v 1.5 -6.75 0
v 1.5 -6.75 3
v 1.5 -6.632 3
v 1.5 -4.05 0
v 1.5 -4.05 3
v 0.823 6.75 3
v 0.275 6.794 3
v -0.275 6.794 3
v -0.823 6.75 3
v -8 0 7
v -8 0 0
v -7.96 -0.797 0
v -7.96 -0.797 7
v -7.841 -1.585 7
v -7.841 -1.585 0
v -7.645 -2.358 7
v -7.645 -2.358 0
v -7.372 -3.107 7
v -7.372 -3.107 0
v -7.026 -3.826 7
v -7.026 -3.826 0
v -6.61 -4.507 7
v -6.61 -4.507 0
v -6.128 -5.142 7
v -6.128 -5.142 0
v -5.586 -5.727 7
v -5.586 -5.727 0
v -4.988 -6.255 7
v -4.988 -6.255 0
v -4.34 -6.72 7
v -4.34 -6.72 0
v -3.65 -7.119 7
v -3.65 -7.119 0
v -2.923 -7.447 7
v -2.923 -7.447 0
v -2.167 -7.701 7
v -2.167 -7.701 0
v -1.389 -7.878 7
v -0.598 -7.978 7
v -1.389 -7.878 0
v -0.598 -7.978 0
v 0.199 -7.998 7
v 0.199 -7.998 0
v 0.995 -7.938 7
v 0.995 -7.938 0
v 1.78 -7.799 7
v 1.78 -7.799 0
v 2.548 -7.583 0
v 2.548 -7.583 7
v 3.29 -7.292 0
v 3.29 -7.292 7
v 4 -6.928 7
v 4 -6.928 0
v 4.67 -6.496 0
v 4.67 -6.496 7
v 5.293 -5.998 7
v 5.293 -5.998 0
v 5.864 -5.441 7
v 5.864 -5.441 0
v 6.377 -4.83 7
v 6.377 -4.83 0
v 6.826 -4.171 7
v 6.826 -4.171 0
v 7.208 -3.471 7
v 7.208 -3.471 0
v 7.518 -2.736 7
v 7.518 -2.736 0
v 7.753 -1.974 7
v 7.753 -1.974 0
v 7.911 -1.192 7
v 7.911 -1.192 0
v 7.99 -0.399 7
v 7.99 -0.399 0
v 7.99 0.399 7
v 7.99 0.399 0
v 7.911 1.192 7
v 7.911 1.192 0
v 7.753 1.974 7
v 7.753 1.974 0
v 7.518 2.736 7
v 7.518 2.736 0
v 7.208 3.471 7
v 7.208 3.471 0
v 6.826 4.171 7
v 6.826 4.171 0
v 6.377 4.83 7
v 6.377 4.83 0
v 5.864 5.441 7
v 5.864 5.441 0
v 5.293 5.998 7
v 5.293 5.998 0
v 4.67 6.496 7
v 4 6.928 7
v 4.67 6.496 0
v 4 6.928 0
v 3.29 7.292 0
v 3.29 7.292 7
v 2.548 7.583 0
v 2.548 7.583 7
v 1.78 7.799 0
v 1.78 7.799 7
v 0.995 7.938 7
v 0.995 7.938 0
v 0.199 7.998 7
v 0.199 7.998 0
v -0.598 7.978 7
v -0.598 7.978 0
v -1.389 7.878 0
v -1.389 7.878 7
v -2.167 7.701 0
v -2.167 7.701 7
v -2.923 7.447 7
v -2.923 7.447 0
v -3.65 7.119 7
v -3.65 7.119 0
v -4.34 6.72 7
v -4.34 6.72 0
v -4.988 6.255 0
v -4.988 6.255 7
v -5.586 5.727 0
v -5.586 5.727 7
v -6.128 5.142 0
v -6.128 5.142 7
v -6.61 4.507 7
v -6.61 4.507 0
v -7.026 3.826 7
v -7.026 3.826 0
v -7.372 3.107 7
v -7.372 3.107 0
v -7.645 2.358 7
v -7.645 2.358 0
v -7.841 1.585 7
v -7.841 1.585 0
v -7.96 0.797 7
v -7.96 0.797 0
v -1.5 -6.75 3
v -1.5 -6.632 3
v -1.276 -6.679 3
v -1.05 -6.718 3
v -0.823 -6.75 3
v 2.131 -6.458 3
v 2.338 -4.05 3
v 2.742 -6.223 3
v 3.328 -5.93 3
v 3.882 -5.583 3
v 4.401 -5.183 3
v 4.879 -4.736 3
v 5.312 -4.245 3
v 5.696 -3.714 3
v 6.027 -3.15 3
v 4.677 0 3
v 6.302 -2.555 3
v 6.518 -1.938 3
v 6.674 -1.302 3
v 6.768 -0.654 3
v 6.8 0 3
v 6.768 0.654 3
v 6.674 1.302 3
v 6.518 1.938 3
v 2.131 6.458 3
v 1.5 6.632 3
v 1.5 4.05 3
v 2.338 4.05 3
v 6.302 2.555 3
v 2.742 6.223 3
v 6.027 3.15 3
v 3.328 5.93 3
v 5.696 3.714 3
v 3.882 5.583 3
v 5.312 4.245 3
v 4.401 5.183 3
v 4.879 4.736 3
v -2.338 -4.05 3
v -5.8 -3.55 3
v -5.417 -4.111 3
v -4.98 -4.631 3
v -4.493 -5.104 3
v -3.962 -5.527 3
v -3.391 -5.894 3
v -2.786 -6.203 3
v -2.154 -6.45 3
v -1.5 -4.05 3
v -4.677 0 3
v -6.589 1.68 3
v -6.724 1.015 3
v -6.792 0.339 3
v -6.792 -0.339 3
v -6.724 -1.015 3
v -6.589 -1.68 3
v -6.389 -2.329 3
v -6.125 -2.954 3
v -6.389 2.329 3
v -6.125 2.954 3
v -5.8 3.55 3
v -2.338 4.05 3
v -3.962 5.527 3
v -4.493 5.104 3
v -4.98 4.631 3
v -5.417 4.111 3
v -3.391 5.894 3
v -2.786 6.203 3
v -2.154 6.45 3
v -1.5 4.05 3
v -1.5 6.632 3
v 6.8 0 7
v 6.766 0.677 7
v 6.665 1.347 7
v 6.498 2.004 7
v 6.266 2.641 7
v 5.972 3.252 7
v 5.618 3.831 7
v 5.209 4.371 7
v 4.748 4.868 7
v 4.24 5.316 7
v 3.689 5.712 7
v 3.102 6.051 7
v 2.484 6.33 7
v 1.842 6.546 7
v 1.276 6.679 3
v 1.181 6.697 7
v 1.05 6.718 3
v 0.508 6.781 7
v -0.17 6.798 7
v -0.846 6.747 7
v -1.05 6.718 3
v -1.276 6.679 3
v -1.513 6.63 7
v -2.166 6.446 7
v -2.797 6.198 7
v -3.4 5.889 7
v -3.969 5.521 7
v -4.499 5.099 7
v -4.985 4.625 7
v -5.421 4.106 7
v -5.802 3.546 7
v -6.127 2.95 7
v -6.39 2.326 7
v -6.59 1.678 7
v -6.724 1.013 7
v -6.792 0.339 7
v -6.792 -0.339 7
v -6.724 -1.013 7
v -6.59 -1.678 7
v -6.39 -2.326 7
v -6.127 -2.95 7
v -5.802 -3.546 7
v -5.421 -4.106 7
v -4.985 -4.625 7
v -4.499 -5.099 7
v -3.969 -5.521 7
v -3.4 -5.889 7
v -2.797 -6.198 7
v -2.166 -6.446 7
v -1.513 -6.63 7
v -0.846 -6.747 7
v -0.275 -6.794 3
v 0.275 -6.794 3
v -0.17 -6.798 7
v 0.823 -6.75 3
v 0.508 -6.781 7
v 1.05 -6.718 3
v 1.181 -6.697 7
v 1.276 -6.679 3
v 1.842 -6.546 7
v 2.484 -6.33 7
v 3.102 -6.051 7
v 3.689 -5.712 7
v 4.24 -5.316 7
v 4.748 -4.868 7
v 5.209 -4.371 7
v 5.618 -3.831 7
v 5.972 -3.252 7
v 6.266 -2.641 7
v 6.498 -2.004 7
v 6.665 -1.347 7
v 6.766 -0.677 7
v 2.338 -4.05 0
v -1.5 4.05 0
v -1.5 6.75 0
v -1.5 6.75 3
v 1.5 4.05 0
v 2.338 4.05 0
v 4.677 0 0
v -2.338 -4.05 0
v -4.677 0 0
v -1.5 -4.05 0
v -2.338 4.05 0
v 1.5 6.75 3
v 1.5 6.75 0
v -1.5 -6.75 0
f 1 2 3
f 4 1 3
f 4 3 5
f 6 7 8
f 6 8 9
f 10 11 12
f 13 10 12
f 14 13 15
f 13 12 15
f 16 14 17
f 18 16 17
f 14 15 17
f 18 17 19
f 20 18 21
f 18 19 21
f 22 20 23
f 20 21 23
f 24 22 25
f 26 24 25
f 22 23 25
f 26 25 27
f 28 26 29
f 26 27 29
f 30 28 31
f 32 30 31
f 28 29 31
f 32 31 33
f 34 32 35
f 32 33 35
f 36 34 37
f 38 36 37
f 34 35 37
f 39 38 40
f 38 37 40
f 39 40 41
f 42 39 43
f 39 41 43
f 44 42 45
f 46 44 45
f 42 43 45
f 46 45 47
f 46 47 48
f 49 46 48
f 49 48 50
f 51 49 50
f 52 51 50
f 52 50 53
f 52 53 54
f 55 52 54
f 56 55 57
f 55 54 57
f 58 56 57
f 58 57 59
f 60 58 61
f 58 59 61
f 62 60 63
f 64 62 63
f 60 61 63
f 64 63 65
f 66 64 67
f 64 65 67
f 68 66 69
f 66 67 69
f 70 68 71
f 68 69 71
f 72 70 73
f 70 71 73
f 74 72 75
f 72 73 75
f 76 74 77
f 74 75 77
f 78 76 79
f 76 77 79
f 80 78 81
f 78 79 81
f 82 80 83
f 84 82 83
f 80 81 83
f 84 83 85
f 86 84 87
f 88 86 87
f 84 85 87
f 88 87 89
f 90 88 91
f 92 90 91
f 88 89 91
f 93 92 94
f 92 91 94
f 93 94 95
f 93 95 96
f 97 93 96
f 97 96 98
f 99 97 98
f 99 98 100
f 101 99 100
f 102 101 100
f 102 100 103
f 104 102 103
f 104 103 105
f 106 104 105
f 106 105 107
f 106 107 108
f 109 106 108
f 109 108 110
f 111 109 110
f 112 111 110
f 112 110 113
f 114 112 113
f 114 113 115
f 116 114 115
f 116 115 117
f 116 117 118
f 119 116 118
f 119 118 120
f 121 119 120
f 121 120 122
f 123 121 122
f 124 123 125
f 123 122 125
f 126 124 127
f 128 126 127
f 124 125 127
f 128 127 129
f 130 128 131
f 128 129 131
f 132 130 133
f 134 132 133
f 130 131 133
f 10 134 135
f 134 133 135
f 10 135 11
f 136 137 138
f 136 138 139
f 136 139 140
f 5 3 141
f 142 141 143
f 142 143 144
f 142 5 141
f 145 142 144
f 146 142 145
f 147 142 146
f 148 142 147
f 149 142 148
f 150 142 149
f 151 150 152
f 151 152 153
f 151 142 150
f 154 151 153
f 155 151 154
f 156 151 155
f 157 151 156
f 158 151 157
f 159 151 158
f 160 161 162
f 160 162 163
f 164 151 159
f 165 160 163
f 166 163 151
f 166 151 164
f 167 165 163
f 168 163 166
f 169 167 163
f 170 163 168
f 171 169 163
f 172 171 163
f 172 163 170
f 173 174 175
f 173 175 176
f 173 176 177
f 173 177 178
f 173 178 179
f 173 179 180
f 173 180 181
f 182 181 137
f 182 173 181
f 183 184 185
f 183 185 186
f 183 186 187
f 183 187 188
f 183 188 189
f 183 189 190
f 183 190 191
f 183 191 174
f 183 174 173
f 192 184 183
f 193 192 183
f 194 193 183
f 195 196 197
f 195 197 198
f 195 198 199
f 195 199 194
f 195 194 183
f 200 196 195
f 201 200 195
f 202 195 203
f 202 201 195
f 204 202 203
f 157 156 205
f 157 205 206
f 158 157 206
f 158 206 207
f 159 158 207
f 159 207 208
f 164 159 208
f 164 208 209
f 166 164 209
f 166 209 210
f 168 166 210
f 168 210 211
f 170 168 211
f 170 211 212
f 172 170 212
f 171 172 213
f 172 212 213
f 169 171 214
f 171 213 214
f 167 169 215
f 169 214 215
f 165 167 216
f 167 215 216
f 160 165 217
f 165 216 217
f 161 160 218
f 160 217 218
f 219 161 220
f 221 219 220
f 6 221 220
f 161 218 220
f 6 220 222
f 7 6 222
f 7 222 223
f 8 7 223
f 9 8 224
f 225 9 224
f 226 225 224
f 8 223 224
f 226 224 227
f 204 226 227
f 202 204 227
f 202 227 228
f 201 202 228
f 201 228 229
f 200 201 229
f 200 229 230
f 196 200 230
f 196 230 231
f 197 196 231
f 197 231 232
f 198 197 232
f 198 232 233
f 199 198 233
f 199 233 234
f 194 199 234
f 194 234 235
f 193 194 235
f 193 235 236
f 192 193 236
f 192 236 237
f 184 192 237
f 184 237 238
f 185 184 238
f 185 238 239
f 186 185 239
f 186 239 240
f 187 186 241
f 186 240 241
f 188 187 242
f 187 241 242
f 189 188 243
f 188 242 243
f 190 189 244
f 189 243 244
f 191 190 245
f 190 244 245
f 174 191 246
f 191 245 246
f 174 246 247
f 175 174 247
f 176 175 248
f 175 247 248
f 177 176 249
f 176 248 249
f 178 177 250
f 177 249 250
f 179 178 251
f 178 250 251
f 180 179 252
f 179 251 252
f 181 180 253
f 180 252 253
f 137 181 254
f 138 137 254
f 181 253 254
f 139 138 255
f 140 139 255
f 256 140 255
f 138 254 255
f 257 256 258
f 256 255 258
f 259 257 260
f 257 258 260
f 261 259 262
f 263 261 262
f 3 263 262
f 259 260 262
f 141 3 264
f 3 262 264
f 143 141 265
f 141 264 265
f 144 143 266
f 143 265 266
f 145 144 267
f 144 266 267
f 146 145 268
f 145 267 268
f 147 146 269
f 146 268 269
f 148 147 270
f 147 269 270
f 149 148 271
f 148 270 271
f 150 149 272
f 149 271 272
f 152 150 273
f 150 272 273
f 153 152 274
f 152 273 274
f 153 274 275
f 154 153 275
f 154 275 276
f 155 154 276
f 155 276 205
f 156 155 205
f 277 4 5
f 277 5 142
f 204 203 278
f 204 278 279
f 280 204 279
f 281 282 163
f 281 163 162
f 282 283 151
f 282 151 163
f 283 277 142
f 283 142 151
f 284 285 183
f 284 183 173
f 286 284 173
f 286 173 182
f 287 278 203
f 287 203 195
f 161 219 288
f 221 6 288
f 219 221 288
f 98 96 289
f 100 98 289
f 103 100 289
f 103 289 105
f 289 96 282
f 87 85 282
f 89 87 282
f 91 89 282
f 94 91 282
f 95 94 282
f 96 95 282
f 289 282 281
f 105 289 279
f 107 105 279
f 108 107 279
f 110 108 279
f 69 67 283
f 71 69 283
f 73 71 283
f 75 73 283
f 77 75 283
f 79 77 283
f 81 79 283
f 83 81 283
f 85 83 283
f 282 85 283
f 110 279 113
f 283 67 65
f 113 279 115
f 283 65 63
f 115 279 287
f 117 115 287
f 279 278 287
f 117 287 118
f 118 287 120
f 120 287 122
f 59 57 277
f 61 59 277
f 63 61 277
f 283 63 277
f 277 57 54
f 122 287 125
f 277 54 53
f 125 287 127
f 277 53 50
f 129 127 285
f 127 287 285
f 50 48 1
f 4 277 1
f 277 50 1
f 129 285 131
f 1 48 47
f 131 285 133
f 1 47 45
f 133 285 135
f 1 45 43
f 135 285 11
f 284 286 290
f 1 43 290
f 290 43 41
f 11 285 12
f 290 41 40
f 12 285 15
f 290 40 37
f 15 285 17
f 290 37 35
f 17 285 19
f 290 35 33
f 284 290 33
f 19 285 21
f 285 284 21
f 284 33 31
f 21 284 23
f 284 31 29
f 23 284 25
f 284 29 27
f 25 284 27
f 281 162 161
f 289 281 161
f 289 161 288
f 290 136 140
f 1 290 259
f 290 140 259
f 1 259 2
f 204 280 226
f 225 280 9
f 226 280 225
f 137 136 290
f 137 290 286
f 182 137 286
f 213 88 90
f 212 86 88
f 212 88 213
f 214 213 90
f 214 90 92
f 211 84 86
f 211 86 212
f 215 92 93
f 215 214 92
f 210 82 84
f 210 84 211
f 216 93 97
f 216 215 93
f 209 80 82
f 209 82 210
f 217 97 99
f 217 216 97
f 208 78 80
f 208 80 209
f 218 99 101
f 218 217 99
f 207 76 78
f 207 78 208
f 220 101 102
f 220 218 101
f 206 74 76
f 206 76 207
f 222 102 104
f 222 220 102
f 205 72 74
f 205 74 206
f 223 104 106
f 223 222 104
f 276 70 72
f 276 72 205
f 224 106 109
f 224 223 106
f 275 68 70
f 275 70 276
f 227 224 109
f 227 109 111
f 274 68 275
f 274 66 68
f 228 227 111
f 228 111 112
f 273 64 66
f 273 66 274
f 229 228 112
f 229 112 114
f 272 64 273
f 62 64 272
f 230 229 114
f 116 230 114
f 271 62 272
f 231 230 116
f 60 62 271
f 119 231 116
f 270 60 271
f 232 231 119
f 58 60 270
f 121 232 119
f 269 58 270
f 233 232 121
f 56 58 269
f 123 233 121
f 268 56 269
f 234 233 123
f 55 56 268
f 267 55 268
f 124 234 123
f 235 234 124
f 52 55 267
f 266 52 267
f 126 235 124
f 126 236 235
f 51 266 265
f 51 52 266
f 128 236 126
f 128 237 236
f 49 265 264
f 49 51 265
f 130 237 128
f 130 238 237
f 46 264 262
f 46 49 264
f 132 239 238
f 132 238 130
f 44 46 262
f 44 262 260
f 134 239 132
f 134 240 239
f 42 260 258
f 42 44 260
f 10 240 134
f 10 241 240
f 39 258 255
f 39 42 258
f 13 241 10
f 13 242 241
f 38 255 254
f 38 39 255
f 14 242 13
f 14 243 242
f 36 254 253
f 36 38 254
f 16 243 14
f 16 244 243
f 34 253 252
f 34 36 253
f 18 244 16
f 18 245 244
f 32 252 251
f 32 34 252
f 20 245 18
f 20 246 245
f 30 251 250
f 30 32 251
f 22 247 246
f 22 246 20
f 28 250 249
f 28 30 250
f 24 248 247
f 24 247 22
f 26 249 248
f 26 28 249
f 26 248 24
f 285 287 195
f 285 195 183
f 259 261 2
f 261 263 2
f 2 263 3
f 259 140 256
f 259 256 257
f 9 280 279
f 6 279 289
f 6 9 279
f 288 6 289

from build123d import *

# Parameters (mm, degrees)
SKETCH1_R           = 8
BOSS_EXTRUDE1_DEPTH = 7
SKETCH2_R           = 6.8
CUT_EXTRUDE1_DEPTH  = 4
CUT_EXTRUDE2_DEPTH  = 4
SKETCH5_W           = 3
SKETCH5_H           = 3
CUT_EXTRUDE4_DEPTH  = 13


with BuildPart() as part:
    # Sketch1 → Boss-Extrude1 (new body)
    with BuildSketch(Plane.XY):
        with Locations(Location((0, 0, 0), (0, 0, 180))):
            Circle(SKETCH1_R)
    extrude(amount=BOSS_EXTRUDE1_DEPTH)

    # Sketch2 → Cut-Extrude1 (cut)
    with BuildSketch(Plane.XY.offset(7)):
        Circle(SKETCH2_R)
    extrude(amount=-CUT_EXTRUDE1_DEPTH, mode=Mode.SUBTRACT)

    # Sketch3 → Cut-Extrude2 (cut)
    with BuildSketch(Plane.XY):
        Polygon((4.67653718, 0), (2.33826859, 4.05), (-2.33826859, 4.05), (-4.67653718, 0), (-2.33826859, -4.05), (2.33826859, -4.05), align=None)
    extrude(amount=CUT_EXTRUDE2_DEPTH, mode=Mode.SUBTRACT)

    # Sketch5 → Cut-Extrude4 (cut, through all)
    with BuildSketch(Plane.XY.offset(3)):
        with Locations((0, 5.25)):
            Rectangle(SKETCH5_W, SKETCH5_H)
        with Locations((0, -5.25)):
            Rectangle(SKETCH5_W, SKETCH5_H)
    extrude(amount=-CUT_EXTRUDE4_DEPTH, mode=Mode.SUBTRACT)


solid = part.part
